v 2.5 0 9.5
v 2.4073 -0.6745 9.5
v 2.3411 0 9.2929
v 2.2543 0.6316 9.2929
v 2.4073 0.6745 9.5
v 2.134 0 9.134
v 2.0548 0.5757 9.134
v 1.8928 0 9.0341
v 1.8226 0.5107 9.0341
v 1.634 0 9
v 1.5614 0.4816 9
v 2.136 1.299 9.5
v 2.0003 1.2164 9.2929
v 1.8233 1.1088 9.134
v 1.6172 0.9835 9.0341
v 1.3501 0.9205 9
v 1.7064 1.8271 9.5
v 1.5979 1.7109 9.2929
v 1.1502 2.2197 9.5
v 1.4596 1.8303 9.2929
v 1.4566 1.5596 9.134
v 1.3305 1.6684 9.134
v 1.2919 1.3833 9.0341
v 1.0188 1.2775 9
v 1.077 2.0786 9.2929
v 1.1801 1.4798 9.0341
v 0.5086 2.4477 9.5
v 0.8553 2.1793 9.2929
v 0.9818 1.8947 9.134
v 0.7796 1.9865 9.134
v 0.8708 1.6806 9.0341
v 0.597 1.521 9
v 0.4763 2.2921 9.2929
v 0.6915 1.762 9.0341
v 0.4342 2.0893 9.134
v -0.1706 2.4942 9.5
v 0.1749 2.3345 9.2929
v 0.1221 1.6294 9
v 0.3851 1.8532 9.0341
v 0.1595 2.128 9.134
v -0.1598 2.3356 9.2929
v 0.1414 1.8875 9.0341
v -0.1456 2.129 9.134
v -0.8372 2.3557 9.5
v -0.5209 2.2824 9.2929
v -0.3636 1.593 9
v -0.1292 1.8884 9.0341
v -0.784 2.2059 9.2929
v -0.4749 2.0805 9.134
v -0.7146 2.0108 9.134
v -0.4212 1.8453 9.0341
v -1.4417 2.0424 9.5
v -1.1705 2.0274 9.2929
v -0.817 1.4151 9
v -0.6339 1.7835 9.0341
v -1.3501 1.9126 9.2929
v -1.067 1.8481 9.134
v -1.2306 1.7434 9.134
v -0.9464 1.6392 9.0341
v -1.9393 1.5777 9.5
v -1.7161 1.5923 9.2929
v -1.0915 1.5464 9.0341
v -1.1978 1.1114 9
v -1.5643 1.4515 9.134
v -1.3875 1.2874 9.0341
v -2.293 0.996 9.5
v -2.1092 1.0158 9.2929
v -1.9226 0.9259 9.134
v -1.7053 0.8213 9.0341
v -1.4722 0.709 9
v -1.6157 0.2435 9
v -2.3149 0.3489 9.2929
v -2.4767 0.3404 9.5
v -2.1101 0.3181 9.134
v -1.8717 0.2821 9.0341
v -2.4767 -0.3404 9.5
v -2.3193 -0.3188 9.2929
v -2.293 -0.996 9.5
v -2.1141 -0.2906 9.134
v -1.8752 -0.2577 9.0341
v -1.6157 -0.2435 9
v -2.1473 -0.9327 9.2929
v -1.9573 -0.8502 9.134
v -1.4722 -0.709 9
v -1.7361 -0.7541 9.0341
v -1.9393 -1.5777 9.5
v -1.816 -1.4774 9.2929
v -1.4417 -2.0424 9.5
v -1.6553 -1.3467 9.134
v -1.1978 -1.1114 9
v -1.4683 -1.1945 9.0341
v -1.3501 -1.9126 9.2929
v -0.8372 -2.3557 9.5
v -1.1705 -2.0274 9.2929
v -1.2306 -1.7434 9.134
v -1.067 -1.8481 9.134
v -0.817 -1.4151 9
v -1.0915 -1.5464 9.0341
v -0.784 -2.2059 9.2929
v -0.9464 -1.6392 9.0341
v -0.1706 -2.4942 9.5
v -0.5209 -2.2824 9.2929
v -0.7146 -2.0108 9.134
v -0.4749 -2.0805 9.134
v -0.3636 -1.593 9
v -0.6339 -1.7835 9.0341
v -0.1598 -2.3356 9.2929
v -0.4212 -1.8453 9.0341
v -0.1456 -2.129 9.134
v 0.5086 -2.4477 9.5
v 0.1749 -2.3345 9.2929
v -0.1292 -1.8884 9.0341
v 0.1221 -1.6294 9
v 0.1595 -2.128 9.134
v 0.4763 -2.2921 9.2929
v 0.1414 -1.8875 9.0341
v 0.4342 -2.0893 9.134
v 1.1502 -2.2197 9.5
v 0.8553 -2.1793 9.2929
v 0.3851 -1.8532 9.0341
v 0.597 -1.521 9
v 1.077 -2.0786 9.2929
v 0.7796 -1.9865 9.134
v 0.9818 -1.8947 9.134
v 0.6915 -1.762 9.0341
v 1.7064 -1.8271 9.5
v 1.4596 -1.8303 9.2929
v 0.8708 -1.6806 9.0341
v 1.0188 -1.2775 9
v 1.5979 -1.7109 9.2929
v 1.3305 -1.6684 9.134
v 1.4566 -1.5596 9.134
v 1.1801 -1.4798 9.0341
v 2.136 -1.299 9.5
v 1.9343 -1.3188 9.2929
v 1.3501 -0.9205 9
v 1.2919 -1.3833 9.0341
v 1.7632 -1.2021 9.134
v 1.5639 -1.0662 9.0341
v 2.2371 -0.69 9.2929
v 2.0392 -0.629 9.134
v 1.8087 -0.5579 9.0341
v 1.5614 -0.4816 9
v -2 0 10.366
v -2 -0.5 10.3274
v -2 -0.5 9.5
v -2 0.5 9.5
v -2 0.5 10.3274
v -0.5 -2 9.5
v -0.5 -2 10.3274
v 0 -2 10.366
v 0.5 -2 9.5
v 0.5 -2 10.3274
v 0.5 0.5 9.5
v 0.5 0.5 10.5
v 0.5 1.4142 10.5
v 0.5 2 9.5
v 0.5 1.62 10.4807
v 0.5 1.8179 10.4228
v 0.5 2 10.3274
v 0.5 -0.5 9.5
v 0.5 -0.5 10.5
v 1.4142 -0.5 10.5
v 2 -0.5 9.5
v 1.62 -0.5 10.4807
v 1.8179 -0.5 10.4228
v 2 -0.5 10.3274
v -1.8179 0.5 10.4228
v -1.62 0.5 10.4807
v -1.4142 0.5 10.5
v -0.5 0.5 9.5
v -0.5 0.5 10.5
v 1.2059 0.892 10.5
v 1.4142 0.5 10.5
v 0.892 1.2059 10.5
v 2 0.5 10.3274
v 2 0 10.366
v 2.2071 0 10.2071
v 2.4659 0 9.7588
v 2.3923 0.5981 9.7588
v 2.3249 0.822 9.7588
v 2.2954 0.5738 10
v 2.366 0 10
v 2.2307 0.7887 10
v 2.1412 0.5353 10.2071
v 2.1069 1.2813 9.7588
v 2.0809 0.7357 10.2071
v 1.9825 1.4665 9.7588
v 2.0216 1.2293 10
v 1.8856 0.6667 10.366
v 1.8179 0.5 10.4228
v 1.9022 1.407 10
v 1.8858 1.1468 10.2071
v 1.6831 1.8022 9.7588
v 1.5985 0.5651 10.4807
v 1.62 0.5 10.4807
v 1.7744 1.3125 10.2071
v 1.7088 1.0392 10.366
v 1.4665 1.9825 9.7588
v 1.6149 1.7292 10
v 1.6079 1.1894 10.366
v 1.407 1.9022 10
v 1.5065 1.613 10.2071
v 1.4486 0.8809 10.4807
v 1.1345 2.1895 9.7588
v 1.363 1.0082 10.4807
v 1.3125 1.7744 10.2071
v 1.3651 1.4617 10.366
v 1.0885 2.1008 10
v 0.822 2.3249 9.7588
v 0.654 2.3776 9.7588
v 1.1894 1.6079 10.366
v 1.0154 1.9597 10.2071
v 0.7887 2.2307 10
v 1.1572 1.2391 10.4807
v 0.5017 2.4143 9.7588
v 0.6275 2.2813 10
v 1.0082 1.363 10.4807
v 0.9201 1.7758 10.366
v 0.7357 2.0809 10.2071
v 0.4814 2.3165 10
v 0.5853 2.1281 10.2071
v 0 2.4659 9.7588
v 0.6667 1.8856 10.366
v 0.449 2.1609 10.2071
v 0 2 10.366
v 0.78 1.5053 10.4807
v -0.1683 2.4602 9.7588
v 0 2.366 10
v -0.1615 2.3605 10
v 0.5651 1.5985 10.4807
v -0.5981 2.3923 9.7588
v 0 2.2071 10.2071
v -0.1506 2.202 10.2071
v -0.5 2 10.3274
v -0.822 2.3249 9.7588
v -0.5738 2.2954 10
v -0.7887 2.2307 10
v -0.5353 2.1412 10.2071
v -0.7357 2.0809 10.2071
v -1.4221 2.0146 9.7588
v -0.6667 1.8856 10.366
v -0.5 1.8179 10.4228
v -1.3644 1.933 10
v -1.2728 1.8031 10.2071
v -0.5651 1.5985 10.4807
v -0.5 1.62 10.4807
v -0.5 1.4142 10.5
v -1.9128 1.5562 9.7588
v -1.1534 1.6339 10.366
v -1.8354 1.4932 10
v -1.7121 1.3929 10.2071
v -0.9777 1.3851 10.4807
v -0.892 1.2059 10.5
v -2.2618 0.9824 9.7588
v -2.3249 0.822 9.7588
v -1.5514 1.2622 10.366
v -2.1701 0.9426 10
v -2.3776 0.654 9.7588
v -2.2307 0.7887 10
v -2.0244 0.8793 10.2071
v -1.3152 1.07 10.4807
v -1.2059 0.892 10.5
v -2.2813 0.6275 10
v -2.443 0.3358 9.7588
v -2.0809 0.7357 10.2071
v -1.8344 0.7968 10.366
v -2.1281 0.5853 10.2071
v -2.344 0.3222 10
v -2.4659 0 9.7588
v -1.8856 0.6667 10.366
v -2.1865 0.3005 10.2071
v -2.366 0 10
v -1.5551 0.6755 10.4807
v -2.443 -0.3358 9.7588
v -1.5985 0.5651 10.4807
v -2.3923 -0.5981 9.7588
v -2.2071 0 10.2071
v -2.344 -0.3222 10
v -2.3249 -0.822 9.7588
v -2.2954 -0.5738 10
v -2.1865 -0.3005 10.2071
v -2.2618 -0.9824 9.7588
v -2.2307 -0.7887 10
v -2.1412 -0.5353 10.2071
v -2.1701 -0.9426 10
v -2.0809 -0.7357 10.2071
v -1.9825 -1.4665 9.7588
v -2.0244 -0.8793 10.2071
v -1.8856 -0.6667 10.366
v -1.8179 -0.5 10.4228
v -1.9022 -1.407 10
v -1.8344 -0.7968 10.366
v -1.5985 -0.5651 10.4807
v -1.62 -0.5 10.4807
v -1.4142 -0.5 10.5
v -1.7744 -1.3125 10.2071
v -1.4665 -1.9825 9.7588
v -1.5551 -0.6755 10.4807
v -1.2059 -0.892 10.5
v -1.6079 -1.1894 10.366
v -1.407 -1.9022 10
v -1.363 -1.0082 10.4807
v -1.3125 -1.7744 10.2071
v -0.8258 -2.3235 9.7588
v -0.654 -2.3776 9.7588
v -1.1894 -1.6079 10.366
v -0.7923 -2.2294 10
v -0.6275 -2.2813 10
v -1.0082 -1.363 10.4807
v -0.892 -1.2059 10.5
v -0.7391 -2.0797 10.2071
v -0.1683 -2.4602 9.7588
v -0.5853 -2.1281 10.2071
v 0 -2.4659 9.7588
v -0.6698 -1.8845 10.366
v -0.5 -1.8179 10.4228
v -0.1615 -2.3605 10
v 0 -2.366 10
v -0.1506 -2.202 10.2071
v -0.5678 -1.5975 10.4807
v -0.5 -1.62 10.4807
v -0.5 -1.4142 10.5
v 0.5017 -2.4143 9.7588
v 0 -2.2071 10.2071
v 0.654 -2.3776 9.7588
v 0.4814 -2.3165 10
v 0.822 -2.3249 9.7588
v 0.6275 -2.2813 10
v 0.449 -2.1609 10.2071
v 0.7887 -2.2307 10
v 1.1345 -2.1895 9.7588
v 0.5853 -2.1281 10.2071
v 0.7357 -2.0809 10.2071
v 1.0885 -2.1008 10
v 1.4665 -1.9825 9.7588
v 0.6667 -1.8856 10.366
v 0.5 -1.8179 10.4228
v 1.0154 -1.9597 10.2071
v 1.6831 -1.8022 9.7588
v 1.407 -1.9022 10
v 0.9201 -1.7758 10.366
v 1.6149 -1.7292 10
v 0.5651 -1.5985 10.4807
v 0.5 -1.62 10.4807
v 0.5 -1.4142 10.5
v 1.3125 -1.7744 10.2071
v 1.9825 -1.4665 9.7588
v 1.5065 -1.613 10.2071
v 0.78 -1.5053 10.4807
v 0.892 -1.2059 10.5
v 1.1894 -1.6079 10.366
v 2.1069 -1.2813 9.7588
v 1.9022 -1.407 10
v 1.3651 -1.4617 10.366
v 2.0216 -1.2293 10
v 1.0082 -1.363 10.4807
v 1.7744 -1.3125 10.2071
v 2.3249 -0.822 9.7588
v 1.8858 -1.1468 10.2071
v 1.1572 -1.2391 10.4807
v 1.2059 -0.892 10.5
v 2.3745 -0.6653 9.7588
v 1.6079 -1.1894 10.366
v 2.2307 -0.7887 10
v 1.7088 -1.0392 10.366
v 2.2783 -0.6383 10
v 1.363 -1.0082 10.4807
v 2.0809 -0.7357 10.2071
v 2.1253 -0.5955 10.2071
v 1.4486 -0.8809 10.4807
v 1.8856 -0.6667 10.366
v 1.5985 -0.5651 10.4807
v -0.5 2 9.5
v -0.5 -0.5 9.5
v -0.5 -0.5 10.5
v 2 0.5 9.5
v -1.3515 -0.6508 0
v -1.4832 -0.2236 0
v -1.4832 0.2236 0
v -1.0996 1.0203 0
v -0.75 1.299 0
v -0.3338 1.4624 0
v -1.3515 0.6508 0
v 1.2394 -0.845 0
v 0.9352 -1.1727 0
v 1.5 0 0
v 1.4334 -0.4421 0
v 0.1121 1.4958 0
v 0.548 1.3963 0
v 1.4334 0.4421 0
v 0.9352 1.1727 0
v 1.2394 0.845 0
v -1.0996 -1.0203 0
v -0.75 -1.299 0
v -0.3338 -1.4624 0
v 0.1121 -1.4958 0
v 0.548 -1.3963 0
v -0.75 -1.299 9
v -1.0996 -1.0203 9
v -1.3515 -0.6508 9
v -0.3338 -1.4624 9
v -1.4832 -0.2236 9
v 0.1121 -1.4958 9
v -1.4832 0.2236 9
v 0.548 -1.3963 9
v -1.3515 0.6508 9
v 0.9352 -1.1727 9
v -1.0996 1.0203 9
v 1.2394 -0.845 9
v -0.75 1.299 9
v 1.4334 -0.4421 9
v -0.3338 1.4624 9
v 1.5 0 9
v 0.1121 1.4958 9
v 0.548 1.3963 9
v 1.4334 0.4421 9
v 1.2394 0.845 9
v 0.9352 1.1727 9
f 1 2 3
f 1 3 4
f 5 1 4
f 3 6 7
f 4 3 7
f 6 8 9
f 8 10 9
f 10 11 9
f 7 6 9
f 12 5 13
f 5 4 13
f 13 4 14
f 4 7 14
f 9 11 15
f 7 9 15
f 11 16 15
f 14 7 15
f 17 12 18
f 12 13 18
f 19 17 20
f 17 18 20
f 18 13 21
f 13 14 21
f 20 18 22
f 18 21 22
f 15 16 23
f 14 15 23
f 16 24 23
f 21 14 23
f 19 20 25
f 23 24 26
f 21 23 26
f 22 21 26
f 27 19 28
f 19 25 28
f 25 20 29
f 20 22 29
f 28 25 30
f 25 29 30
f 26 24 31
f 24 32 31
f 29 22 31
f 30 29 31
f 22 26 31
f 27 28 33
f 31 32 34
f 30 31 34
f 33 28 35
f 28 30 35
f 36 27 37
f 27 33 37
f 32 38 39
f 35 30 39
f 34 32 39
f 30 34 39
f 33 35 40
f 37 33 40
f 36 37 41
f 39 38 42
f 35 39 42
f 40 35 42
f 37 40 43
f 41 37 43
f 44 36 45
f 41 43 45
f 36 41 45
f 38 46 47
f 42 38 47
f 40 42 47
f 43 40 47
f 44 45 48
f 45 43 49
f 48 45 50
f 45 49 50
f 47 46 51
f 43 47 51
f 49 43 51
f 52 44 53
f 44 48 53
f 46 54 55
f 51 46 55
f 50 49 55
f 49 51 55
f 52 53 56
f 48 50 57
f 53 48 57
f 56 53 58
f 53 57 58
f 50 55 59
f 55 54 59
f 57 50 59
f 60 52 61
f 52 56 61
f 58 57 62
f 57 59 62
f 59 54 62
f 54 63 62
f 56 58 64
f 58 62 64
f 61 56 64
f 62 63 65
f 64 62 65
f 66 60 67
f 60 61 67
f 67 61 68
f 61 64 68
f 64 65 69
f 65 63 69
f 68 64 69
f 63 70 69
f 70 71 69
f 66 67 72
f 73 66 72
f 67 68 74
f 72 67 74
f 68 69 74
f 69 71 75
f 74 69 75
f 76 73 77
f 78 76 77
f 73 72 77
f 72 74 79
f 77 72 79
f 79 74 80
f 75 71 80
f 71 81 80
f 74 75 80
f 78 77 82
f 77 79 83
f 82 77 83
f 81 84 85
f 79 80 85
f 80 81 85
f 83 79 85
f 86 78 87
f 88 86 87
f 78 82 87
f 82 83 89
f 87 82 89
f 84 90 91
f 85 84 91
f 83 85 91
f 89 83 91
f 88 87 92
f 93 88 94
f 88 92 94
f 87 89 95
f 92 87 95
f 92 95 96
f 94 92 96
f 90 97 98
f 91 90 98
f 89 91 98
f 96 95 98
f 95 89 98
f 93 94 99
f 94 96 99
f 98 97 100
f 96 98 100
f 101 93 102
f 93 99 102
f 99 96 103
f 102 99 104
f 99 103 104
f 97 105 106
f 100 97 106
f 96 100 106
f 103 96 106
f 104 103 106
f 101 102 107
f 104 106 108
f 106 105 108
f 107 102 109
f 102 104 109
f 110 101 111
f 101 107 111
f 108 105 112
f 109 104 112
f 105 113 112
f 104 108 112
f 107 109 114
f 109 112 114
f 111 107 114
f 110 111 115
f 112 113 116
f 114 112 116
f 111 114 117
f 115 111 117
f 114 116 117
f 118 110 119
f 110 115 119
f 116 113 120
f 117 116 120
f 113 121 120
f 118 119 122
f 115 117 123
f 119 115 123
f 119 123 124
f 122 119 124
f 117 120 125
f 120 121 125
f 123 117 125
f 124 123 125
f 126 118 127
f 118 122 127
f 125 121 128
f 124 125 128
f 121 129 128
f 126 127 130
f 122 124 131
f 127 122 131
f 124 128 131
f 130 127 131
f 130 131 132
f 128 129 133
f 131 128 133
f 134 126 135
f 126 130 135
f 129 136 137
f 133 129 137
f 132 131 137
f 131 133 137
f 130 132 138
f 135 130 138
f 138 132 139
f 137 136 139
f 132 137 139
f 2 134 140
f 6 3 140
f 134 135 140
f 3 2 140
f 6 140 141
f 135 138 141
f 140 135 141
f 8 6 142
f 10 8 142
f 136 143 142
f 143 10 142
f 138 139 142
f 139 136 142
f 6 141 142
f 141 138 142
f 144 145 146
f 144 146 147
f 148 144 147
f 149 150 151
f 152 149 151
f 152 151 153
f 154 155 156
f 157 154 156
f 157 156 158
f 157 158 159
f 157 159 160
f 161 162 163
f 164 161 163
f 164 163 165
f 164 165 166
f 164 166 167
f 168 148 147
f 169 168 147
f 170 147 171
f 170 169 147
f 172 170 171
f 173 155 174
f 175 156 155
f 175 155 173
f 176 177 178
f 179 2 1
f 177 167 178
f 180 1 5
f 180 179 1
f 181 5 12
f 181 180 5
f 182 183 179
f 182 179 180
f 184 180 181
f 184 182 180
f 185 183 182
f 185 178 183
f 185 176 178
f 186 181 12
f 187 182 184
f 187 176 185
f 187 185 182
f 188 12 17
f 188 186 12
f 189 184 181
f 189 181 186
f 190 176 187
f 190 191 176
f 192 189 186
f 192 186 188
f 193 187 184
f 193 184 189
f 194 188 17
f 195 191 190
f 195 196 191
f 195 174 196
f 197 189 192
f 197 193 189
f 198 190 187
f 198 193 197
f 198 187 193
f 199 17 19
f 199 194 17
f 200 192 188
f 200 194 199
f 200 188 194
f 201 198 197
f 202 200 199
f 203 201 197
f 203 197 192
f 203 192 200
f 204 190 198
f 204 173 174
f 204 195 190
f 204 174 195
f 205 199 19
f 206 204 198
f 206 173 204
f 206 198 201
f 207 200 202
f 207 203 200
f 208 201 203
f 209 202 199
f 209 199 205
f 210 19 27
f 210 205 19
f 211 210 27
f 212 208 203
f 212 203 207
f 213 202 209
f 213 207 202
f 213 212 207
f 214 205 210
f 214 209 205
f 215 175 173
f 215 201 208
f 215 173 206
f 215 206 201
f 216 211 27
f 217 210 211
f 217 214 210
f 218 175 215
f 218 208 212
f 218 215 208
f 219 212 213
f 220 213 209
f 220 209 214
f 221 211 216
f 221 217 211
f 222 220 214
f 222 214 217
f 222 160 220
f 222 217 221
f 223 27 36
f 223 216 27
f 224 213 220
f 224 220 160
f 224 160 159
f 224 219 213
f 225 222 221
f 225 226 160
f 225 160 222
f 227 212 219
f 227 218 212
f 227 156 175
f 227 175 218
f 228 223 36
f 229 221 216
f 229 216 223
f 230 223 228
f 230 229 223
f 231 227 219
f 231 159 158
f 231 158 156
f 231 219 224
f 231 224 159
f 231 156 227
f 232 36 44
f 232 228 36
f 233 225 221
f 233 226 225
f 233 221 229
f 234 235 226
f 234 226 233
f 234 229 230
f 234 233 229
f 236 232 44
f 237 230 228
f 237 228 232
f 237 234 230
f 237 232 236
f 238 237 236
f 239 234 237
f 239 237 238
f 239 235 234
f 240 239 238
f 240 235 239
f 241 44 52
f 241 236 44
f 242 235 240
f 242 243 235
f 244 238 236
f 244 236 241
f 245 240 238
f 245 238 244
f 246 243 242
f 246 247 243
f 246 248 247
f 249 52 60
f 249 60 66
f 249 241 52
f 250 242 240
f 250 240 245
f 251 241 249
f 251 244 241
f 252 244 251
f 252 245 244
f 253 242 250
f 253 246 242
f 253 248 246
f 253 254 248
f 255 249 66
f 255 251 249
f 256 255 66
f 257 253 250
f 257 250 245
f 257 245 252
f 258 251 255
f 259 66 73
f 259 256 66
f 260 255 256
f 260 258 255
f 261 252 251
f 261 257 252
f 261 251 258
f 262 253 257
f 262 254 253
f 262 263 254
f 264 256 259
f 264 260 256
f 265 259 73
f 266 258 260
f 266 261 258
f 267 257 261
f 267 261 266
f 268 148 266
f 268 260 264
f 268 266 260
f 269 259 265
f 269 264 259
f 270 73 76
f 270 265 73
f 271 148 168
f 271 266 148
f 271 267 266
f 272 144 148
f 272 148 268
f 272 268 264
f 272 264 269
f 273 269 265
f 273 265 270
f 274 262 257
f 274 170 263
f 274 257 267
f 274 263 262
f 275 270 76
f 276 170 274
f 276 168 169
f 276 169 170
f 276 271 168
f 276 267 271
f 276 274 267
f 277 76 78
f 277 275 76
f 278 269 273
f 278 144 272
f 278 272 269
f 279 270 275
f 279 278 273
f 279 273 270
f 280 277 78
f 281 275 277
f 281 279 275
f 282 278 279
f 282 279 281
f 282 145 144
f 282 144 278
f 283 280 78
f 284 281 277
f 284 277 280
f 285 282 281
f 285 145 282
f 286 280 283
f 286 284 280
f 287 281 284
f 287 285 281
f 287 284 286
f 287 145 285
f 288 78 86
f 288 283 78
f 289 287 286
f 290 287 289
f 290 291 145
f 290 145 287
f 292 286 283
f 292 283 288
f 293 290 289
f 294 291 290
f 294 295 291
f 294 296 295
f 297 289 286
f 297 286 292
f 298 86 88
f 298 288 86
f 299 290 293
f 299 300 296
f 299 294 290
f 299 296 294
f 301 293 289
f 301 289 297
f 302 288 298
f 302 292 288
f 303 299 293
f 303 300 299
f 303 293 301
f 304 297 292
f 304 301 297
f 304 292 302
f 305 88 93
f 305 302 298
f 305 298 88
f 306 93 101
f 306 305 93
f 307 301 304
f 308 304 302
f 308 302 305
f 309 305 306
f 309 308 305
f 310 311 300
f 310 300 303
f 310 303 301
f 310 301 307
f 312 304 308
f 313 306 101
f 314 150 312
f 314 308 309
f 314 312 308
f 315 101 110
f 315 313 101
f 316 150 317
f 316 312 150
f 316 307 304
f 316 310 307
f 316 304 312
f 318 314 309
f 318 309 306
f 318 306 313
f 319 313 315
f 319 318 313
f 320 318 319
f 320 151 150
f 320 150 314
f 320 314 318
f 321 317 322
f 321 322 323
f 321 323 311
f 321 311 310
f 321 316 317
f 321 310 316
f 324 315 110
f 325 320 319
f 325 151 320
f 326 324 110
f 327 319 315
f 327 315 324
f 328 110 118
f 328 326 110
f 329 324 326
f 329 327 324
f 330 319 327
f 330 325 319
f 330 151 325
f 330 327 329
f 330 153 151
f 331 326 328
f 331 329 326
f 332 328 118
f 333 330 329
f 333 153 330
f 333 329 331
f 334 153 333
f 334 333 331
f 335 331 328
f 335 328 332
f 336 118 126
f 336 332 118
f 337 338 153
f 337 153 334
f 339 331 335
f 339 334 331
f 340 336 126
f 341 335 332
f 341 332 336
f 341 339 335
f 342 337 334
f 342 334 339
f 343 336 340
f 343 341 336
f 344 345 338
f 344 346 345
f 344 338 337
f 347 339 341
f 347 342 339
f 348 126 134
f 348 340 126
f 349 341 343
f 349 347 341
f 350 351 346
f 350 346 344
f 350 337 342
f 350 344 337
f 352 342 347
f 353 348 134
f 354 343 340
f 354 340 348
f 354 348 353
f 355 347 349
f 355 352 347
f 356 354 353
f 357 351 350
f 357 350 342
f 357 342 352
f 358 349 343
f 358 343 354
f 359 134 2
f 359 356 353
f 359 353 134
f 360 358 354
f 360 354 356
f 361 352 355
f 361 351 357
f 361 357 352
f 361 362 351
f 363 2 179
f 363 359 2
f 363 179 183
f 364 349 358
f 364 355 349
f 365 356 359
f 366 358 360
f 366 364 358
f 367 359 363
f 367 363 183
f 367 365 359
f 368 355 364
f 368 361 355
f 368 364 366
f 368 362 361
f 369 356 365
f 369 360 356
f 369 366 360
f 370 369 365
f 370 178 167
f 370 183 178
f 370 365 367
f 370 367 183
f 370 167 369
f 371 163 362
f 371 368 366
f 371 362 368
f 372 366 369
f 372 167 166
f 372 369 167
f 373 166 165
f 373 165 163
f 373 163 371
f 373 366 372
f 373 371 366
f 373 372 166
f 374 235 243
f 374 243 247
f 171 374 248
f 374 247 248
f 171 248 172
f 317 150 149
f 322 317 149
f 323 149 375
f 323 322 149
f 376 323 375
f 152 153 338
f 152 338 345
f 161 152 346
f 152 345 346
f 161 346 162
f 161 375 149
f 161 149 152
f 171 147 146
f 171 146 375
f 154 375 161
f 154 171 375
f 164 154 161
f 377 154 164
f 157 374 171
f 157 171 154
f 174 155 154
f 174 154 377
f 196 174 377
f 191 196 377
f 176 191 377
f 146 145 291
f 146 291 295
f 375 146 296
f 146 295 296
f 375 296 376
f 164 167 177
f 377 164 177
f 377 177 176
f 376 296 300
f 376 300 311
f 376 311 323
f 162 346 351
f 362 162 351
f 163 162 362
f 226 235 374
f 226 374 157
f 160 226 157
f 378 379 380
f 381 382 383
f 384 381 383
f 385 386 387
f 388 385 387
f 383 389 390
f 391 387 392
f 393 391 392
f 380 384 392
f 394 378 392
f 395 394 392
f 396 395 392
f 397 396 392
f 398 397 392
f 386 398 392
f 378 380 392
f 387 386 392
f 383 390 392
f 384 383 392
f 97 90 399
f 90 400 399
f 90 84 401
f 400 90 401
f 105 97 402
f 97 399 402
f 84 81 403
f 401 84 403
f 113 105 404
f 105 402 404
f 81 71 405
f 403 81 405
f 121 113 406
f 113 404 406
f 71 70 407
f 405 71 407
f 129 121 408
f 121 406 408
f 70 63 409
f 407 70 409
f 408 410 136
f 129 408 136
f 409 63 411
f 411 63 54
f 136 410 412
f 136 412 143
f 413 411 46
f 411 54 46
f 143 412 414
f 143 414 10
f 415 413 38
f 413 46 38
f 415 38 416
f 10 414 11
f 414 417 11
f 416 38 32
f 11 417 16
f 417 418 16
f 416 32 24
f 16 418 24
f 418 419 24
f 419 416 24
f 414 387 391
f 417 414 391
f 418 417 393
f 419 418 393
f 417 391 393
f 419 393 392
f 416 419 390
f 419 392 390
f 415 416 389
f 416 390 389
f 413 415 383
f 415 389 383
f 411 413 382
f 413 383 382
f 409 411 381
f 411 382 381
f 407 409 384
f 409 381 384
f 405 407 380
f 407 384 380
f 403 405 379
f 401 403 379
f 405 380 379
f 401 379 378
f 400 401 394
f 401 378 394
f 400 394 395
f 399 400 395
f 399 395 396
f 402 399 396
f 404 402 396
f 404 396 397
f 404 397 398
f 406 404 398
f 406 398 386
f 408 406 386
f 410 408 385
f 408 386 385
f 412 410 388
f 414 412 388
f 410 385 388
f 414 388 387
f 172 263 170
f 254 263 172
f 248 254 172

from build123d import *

# Parameters (mm, degrees)
F0_R     = 1.5
F1_DEPTH = 9
F2_R     = 2.5
F3_DEPTH = 1.5
F4_W     = 1
F4_H     = 1.5
F4_H_2   = 1
F4_W_2   = 1.5
F5_DEPTH = 1


# Not quite as in the source:
# - a fillet or chamfer that OpenCascade refuses, or shapes differently, is made with other operations: its cross-section is extruded or revolved along the edge and cut away or added


with BuildPart() as f1:
    # F0 (on Top) → F1 (new body)
    with BuildSketch(Plane.XY):
        Circle(F0_R)
    extrude(amount=F1_DEPTH)

    # F2 (on face) → F3 (join)
    with BuildSketch(Plane.XY.offset(9)):
        Circle(F2_R)
    extrude(amount=F3_DEPTH)

    # F4 (on face) → F5 (cut)
    with BuildSketch(Plane.XY.offset(10.5)):
        with Locations((0, 1.25)):
            Rectangle(F4_W, F4_H)
        Rectangle(F4_W, F4_H_2)
        with Locations((-1.25, 0)):
            Rectangle(F4_W_2, F4_H_2)
        with Locations((1.25, 0)):
            Rectangle(F4_W_2, F4_H_2)
        with Locations((0, -1.25)):
            Rectangle(F4_W, F4_H)
    extrude(amount=-F5_DEPTH, mode=Mode.SUBTRACT)

    # F6: fillet of radius 1 on 1 edges, made by hand

    # F6_s1 → F6_t2 (revolve, cut)
    with BuildSketch(Plane.XZ):
        with BuildLine():
            ThreePointArc((2.5, 9.5), (2.2071067812, 10.2071067812), (1.5, 10.5))
            Line((1.5, 10.5), (2.5, 10.5))
            Line((2.5, 10.5), (2.5, 9.5))
        make_face()
    revolve(axis=Axis((0, 0, 10.5), (0, 0, 1)), mode=Mode.SUBTRACT)

    # F7: fillet of radius 1 on 1 edges, made by hand

    # F7_s1 → F7_t2 (revolve, cut)
    with BuildSketch(Plane.XZ):
        with BuildLine():
            ThreePointArc((2.5, 9.5), (2.1339745962, 9.1339745962), (1.6339745962, 9))
            Line((1.6339745962, 9), (2.5, 9))
            Line((2.5, 9), (2.5, 9.5))
        make_face()
    revolve(axis=Axis((0, 0, 9), (0, 0, 1)), mode=Mode.SUBTRACT)


solid = f1.part
